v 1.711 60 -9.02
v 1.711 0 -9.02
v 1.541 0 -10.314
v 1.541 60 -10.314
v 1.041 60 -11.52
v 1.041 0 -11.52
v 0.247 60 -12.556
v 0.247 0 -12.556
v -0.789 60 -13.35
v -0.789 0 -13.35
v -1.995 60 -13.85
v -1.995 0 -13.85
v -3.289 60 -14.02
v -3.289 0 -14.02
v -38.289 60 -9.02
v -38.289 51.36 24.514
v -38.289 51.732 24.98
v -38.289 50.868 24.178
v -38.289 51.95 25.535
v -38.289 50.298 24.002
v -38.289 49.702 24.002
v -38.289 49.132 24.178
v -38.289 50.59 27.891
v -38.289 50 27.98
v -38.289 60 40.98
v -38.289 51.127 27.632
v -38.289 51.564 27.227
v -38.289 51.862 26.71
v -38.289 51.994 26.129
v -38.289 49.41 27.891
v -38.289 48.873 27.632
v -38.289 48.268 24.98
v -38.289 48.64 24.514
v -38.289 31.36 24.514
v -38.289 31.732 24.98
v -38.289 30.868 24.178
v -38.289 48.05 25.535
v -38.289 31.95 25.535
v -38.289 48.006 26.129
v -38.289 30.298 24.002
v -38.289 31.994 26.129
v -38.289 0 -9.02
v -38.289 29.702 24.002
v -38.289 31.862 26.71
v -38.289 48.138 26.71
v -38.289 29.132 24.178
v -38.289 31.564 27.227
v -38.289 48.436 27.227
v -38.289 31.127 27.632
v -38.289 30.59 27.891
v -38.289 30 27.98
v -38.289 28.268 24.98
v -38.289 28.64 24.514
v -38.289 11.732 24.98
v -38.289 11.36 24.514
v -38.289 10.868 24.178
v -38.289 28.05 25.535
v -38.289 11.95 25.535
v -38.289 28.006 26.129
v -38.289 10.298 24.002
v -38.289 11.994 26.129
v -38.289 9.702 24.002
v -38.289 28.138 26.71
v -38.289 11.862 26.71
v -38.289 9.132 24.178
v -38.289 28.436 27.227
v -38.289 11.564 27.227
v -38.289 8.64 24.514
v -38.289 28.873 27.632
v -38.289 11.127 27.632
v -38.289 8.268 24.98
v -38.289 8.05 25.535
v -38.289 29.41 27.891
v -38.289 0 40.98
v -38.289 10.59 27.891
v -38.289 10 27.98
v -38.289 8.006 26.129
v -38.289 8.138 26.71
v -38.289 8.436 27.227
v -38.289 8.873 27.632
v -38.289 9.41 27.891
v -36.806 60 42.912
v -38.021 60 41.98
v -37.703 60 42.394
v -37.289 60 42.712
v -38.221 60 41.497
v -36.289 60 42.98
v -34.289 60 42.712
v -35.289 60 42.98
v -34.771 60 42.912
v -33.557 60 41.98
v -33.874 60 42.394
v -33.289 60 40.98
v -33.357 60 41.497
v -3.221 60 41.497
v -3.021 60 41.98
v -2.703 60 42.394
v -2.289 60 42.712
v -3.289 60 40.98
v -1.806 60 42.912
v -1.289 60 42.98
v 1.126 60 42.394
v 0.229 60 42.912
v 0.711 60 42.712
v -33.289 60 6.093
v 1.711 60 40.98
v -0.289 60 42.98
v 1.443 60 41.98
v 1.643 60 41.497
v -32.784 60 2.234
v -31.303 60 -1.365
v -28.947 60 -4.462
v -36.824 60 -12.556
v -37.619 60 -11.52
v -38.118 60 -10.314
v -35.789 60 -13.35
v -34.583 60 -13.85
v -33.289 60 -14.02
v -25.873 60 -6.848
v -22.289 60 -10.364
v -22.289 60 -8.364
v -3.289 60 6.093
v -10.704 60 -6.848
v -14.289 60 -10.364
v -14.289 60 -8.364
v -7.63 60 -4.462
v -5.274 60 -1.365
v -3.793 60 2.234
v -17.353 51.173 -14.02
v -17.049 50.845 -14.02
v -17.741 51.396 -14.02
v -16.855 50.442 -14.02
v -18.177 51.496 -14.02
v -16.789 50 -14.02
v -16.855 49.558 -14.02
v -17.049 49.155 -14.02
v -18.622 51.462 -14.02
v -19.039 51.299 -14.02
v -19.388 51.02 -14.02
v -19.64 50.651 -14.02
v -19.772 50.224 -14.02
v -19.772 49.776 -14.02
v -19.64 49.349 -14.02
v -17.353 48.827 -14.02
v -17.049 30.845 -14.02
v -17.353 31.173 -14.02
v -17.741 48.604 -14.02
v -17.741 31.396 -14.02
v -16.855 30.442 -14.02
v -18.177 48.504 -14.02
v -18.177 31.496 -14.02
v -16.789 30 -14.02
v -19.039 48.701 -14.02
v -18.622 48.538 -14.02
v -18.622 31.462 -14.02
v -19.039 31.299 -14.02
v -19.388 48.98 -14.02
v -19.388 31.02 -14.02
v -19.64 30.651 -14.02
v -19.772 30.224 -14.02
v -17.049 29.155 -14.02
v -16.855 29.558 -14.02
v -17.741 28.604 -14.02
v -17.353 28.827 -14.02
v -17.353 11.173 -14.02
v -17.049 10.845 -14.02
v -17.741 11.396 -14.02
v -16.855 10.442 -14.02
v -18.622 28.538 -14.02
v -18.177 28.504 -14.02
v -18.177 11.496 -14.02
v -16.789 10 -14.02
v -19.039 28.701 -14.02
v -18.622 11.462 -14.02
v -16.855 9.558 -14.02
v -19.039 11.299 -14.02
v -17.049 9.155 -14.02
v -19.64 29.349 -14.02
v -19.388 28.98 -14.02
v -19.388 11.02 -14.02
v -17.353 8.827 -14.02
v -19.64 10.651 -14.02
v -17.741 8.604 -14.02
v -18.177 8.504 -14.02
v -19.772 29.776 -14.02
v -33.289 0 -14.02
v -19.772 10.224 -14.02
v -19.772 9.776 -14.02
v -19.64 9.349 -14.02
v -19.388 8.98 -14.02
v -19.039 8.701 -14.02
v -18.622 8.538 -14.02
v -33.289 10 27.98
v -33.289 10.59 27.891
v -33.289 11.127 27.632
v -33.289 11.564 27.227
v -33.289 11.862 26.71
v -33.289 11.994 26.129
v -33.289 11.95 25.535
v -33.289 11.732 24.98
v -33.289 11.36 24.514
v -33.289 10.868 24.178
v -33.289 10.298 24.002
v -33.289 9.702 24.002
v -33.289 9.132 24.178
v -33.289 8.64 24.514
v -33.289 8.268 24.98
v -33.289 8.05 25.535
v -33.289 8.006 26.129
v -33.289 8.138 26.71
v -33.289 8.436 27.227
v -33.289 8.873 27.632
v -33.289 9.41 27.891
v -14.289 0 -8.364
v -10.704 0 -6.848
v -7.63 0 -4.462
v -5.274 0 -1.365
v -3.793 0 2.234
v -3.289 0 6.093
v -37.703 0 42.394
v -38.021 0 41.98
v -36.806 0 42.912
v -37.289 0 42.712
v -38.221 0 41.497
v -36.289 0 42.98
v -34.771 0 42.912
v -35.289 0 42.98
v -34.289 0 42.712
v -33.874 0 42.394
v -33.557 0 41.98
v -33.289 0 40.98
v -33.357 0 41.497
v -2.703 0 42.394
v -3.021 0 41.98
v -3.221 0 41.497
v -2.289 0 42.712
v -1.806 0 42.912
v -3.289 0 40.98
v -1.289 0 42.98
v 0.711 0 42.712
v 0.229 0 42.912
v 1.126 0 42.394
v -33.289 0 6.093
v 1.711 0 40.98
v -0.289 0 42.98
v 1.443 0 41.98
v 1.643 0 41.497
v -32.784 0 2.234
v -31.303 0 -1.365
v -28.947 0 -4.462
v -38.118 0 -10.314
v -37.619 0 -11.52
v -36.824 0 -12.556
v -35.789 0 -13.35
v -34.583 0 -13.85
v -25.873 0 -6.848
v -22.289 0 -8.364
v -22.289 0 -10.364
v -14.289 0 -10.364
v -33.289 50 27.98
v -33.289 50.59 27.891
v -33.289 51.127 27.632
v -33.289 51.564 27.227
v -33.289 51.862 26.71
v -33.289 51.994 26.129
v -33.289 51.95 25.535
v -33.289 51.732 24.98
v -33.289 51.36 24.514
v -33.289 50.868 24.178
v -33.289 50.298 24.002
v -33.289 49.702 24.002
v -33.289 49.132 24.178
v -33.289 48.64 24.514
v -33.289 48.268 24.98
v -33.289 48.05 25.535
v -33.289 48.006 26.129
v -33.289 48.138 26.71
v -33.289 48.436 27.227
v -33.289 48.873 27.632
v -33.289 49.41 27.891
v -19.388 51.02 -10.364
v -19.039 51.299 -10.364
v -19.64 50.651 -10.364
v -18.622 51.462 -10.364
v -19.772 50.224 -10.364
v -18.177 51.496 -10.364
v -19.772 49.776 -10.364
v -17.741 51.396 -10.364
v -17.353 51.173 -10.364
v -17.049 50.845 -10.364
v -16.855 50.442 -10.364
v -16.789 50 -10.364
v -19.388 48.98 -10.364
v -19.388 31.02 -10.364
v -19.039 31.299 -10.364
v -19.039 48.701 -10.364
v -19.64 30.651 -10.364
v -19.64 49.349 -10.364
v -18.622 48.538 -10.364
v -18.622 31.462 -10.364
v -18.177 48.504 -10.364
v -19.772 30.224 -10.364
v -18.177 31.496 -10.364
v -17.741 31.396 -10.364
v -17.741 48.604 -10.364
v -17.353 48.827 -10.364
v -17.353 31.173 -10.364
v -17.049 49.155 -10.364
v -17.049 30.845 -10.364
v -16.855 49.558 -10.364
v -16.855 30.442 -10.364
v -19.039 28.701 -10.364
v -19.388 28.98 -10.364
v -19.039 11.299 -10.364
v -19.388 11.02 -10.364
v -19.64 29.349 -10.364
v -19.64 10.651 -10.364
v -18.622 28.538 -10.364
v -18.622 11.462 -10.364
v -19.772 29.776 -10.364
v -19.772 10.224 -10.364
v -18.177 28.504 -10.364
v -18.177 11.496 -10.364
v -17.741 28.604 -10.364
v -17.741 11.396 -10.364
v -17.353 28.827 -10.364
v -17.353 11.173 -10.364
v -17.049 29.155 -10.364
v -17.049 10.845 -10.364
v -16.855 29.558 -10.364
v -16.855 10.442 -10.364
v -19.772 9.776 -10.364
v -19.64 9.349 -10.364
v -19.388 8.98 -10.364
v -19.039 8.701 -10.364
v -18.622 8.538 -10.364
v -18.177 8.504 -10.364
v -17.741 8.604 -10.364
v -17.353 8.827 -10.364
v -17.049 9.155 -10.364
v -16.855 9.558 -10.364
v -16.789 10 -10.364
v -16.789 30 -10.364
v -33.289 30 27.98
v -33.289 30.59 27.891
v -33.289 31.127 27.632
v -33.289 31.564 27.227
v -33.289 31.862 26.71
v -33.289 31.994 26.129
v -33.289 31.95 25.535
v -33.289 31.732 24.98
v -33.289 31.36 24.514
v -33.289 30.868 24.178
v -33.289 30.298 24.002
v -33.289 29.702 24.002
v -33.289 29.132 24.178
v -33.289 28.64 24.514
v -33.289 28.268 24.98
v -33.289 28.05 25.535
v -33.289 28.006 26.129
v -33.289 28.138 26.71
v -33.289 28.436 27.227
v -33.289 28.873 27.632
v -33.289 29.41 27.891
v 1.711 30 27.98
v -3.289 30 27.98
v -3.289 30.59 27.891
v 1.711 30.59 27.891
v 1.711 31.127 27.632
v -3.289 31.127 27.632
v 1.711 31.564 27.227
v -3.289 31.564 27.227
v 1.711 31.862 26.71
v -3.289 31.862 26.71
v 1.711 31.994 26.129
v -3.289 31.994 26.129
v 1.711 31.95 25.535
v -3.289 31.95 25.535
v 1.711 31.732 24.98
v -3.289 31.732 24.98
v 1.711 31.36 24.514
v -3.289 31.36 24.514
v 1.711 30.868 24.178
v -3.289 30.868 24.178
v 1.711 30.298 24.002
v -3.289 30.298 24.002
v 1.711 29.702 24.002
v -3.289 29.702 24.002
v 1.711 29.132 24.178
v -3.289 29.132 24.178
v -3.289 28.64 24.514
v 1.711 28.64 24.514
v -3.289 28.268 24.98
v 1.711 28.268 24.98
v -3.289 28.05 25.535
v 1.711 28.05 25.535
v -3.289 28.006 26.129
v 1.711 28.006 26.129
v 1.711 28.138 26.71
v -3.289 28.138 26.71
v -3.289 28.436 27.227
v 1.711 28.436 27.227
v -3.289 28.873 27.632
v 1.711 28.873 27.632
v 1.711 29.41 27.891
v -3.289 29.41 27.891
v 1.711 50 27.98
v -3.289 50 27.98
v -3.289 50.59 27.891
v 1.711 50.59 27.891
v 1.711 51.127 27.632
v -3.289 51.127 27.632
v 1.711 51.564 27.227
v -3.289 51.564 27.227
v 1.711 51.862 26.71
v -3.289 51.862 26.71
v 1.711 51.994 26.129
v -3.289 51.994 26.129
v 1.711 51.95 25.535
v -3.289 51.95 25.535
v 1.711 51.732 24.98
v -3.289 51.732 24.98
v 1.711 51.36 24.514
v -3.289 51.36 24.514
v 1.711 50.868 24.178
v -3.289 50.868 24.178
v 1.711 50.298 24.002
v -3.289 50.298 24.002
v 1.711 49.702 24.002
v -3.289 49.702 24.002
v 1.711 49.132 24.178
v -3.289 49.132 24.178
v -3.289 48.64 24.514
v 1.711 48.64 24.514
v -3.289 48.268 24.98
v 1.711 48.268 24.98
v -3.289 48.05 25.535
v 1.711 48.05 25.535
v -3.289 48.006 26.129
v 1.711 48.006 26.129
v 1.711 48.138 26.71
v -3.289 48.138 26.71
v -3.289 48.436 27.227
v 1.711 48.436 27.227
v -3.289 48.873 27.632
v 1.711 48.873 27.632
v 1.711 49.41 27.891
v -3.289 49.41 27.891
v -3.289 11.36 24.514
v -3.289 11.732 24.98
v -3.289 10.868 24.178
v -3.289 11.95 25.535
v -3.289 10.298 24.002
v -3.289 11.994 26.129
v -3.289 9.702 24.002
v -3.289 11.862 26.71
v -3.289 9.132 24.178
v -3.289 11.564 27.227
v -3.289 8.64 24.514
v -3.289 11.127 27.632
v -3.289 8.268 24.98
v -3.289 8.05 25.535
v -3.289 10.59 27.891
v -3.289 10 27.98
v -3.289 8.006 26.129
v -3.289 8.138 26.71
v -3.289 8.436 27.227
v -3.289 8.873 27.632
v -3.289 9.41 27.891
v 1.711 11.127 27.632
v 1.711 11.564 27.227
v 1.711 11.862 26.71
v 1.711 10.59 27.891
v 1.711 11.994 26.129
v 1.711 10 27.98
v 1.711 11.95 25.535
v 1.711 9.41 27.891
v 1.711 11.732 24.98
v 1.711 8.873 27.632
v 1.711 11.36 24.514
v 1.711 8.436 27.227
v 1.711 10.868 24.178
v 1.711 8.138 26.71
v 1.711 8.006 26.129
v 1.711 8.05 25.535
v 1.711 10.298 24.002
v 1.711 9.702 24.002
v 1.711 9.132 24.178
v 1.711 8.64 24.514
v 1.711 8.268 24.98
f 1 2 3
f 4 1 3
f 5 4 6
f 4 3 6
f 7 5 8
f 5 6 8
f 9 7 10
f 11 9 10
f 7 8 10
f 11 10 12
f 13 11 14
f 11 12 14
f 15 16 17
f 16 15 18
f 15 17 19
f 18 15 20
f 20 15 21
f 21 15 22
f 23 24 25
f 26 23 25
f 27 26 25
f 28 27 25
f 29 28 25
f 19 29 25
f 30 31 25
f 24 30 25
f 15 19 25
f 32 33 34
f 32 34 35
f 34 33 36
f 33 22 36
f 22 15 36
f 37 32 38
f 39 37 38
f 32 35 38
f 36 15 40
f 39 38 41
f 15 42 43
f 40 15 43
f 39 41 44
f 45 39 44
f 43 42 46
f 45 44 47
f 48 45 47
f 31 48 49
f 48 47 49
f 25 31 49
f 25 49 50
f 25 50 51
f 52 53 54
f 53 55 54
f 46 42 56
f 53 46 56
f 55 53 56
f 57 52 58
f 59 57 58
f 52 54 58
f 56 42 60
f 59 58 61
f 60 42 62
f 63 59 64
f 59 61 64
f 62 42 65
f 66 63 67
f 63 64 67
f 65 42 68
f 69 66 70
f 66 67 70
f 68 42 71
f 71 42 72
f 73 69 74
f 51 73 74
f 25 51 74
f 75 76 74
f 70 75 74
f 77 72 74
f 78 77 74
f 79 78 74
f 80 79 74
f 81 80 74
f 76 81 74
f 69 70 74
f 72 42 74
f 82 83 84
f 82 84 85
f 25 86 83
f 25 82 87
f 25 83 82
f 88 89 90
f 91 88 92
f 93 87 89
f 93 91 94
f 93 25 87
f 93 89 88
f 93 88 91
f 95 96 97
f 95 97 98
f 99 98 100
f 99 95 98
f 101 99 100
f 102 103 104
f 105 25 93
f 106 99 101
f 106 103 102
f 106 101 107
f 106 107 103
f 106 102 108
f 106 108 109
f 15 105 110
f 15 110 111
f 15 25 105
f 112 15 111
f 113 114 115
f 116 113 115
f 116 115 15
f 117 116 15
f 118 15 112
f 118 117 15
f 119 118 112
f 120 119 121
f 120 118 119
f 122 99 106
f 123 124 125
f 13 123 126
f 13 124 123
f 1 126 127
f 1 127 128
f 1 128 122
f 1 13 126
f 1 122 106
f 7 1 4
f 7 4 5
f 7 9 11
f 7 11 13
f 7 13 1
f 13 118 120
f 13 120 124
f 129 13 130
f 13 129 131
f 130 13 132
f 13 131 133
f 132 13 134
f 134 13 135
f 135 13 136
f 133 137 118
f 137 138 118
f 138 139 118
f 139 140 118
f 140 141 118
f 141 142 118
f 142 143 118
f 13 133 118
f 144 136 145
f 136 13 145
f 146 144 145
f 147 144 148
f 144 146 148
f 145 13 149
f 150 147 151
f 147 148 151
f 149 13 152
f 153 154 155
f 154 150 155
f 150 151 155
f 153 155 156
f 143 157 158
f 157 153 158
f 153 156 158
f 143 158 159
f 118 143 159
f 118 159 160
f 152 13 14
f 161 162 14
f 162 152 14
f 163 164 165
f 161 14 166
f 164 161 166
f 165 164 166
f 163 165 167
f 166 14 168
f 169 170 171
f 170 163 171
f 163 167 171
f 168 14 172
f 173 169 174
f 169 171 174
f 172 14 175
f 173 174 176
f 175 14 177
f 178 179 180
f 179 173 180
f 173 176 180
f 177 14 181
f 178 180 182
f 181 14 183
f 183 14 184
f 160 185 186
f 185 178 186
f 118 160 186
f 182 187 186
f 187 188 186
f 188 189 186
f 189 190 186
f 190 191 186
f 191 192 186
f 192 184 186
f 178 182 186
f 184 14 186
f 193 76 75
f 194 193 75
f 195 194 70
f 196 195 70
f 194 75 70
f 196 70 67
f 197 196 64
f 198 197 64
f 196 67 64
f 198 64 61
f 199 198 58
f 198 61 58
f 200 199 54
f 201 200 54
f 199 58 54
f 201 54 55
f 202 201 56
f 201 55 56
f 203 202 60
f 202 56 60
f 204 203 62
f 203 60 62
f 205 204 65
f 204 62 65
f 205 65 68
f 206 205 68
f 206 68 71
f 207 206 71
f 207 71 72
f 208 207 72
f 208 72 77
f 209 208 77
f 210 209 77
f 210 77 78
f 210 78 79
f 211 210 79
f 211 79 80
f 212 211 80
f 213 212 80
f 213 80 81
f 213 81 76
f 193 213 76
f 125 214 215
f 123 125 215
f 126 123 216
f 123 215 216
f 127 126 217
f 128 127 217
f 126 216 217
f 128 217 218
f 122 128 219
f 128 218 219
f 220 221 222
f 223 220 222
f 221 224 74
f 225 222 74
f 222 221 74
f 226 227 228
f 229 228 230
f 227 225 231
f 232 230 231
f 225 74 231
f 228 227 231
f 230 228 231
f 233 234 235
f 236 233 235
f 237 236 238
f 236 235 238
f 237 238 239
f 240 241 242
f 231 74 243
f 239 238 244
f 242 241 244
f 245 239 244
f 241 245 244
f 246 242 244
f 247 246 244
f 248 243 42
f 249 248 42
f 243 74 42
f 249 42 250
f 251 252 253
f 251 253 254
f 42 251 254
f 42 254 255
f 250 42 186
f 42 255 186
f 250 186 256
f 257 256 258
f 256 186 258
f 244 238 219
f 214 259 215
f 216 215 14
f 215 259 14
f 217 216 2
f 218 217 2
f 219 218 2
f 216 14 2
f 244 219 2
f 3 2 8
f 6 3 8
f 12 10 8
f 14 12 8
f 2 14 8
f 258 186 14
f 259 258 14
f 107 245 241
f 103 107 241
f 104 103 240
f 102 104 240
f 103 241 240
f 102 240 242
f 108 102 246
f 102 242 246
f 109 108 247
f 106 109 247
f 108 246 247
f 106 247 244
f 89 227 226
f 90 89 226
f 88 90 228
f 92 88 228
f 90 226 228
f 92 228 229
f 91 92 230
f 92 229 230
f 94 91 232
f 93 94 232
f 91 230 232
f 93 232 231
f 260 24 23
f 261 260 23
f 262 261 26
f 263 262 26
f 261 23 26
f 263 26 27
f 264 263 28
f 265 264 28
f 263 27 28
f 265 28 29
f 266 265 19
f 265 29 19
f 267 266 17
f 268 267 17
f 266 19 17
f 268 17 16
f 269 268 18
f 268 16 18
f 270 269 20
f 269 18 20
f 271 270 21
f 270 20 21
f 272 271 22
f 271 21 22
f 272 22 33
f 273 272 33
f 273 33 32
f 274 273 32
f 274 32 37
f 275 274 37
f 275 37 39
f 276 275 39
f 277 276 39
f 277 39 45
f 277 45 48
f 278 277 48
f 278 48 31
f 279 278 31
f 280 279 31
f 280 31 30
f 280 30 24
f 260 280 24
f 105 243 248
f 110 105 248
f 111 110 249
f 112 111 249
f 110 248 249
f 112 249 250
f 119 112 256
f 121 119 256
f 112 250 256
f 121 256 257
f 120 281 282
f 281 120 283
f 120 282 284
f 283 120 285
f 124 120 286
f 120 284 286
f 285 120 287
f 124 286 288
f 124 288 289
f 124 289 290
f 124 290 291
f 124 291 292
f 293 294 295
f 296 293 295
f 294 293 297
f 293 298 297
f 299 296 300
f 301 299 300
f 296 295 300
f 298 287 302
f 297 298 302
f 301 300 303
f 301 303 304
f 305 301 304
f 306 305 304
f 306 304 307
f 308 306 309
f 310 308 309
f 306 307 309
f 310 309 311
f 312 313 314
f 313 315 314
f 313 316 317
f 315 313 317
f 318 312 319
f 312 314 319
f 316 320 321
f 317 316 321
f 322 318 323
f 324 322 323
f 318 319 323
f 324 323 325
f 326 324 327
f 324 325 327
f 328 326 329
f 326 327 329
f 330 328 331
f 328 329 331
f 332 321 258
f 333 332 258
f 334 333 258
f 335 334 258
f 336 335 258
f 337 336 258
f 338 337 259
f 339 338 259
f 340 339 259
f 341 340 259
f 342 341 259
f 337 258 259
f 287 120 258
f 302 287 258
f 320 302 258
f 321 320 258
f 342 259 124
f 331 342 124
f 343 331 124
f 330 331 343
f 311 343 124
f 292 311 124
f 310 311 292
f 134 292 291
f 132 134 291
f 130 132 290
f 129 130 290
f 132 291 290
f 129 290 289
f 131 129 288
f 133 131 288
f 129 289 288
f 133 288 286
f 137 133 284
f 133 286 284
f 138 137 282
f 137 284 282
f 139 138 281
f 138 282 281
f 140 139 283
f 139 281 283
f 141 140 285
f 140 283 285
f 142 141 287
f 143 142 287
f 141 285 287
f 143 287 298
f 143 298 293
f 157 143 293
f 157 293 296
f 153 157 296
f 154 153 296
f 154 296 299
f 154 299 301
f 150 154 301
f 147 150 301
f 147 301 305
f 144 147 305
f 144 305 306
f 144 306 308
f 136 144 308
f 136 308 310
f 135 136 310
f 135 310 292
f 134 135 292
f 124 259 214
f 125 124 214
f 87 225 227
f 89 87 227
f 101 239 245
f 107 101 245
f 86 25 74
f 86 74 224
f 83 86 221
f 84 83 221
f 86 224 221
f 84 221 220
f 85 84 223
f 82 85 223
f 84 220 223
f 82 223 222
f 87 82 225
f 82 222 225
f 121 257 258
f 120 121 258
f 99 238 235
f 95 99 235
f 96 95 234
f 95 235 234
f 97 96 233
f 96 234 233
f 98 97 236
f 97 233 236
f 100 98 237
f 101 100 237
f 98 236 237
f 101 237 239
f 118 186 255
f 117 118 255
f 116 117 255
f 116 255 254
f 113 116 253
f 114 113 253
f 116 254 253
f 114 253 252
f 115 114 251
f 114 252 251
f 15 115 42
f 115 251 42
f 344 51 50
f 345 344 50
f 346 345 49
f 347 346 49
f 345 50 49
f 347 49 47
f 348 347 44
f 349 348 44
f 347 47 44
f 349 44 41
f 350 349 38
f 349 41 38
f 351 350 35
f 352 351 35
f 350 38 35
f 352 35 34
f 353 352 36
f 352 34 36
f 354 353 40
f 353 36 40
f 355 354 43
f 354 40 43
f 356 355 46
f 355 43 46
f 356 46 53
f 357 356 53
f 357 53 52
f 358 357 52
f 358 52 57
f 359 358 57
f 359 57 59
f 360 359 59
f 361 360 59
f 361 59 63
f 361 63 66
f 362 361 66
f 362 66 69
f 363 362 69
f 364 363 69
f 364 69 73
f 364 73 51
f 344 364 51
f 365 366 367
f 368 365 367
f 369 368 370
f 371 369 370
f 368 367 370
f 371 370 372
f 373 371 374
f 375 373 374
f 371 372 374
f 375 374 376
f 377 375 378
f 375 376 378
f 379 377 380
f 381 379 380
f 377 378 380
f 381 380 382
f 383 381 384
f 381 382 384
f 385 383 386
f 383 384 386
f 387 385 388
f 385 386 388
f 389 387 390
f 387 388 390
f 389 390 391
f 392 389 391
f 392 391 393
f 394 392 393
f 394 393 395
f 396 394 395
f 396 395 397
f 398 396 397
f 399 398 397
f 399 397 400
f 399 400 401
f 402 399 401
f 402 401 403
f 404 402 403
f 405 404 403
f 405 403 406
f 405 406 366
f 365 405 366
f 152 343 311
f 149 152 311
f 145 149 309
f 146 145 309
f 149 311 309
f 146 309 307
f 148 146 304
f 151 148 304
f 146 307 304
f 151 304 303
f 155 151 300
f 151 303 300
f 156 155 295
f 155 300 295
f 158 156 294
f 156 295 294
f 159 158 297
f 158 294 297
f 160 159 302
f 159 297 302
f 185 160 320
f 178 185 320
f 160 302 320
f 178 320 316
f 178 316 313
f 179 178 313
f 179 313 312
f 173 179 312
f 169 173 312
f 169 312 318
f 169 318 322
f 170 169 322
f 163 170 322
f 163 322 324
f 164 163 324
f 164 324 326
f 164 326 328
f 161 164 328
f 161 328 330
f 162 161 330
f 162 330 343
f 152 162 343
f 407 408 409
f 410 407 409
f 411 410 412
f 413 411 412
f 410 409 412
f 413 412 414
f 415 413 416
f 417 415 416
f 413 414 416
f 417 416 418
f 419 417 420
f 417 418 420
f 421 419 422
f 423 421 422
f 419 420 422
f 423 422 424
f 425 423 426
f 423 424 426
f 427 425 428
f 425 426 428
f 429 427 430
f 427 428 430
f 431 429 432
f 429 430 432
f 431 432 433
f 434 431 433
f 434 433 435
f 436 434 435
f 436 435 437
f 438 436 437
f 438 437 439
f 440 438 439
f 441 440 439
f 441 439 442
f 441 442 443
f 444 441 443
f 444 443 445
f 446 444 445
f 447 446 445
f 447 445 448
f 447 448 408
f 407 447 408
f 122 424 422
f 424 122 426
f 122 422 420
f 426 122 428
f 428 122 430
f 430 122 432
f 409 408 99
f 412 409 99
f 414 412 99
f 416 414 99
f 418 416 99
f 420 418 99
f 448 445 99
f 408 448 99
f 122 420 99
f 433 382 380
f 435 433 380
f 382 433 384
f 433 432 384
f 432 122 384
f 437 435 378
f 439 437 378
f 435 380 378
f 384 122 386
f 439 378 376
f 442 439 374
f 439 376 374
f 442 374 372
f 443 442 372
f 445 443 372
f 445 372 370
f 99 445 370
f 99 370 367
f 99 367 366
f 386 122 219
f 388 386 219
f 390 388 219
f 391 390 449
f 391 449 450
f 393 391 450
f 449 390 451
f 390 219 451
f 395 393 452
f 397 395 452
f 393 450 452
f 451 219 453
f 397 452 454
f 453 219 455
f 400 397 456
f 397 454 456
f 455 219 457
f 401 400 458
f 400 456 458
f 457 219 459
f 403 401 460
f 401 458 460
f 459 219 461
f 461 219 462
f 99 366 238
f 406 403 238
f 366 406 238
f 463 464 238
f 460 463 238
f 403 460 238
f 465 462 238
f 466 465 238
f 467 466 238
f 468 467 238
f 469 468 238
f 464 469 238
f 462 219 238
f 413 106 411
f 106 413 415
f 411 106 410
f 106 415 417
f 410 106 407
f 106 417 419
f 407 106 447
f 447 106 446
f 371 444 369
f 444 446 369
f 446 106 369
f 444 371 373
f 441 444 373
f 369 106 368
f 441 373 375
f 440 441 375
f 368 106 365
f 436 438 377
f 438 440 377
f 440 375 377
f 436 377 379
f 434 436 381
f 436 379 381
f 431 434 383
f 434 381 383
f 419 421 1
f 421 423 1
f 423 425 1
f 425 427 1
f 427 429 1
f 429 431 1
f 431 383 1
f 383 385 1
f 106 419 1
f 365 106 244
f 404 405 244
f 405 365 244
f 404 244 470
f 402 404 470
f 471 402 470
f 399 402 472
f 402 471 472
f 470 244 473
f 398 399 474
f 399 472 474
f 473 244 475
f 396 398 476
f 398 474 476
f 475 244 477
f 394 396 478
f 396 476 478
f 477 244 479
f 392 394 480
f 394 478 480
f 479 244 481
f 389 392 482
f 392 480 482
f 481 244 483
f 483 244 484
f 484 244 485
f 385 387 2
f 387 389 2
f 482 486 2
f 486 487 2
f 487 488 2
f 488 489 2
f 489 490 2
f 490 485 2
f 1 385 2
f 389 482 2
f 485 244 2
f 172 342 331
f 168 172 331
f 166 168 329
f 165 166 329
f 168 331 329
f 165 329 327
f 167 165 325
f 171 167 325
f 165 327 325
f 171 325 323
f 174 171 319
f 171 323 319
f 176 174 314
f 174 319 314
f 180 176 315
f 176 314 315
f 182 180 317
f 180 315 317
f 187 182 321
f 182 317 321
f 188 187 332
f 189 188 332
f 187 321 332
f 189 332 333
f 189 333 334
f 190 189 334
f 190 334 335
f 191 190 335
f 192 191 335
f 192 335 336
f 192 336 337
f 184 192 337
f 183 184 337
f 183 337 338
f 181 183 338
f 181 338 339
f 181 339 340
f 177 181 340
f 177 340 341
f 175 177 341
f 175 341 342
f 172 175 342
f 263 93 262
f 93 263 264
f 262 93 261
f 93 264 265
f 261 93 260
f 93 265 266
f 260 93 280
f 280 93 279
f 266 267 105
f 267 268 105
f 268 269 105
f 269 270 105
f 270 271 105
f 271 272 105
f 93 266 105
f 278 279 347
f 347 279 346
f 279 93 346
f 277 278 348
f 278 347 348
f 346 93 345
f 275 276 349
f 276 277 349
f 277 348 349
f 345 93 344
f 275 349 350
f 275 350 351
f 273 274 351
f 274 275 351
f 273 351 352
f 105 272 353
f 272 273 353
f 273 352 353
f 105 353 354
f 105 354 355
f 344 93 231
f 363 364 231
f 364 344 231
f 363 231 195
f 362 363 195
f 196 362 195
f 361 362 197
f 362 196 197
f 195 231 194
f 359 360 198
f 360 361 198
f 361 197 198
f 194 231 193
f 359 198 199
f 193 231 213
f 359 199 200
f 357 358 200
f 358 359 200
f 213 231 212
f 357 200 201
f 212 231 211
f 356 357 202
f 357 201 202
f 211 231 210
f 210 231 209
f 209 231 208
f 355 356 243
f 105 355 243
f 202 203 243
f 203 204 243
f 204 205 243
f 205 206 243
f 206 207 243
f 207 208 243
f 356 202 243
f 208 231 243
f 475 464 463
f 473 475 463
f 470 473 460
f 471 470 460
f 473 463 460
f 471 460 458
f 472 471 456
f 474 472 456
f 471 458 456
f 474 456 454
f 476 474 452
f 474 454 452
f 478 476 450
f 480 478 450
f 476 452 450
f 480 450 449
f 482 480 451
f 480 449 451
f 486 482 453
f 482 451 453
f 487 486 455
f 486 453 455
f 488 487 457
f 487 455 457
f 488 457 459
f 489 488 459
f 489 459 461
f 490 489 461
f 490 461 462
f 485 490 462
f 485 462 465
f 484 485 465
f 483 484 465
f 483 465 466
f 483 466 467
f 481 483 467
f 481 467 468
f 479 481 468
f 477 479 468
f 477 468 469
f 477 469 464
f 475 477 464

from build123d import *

# Parameters (mm, degrees)
EXTRUDE_1_DEPTH     = 60
SKETCH_2_R          = 1.5
CUT_EXTRUDE_1_DEPTH = 10
SKETCH_3_R          = 2
CUT_EXTRUDE_2_DEPTH = 41


with BuildPart() as part:
    # 草图1 → 凸台-拉伸1 (new body)
    with BuildSketch(Plane(origin=(0, 0, 0), x_dir=(1, 0, 0), z_dir=(0, 1, 0))):
        with BuildLine():
            Line((-33.288662304, -40.97966402), (-33.288662304, -6.09314479))
            ThreePointArc((-33.288662304, -6.09314479), (-30.22599869, 2.989806272), (-22.288662304, 8.363687504))
            Line((-22.288662304, 8.363687504), (-22.288662304, 10.363687504))
            Line((-22.288662304, 10.363687504), (-14.288662304, 10.363687504))
            Line((-14.288662304, 10.363687504), (-14.288662304, 8.363687504))
            ThreePointArc((-14.288662304, 8.363687504), (-6.351325918, 2.989806272), (-3.288662304, -6.09314479))
            Line((-3.288662304, -6.09314479), (-3.288662304, -40.97966402))
            ThreePointArc((-3.288662304, -40.97966402), (-2.702875867, -42.393877582), (-1.288662304, -42.97966402))
            Line((-1.288662304, -42.97966402), (-0.288662304, -42.97966402))
            ThreePointArc((-0.288662304, -42.97966402), (1.125551258, -42.393877582), (1.711337696, -40.97966402))
            Line((1.711337696, -40.97966402), (1.711337696, 9.02033598))
            ThreePointArc((1.711337696, 9.02033598), (0.246871602, 12.555869886), (-3.288662304, 14.02033598))
            Line((-3.288662304, 14.02033598), (-33.288662304, 14.02033598))
            ThreePointArc((-33.288662304, 14.02033598), (-36.82419621, 12.555869886), (-38.288662304, 9.02033598))
            Line((-38.288662304, 9.02033598), (-38.288662304, -40.97966402))
            ThreePointArc((-38.288662304, -40.97966402), (-37.702875867, -42.393877582), (-36.288662304, -42.97966402))
            Line((-36.288662304, -42.97966402), (-35.288662304, -42.97966402))
            ThreePointArc((-35.288662304, -42.97966402), (-33.874448742, -42.393877582), (-33.288662304, -40.97966402))
        make_face()
    extrude(amount=EXTRUDE_1_DEPTH)

    # 草图2 → 切除-拉伸1 (cut)
    with BuildSketch(Plane.XY.offset(-10.363687504)):
        with Locations((-18.288662304, 50)):
            Circle(SKETCH_2_R)
        with Locations((-18.288662304, 30)):
            Circle(SKETCH_2_R)
        with Locations((-18.288662304, 10)):
            Circle(SKETCH_2_R)
    extrude(amount=-CUT_EXTRUDE_1_DEPTH, mode=Mode.SUBTRACT)

    # 草图3 → 切除-拉伸2 (cut, through all)
    with BuildSketch(Plane.ZY.offset(38.288662304)):
        with Locations((25.97966402, 50)):
            Circle(SKETCH_3_R)
        with Locations((25.97966402, 30)):
            Circle(SKETCH_3_R)
        with Locations((25.97966402, 10)):
            Circle(SKETCH_3_R)
    extrude(amount=-CUT_EXTRUDE_2_DEPTH, mode=Mode.SUBTRACT)


solid = part.part
